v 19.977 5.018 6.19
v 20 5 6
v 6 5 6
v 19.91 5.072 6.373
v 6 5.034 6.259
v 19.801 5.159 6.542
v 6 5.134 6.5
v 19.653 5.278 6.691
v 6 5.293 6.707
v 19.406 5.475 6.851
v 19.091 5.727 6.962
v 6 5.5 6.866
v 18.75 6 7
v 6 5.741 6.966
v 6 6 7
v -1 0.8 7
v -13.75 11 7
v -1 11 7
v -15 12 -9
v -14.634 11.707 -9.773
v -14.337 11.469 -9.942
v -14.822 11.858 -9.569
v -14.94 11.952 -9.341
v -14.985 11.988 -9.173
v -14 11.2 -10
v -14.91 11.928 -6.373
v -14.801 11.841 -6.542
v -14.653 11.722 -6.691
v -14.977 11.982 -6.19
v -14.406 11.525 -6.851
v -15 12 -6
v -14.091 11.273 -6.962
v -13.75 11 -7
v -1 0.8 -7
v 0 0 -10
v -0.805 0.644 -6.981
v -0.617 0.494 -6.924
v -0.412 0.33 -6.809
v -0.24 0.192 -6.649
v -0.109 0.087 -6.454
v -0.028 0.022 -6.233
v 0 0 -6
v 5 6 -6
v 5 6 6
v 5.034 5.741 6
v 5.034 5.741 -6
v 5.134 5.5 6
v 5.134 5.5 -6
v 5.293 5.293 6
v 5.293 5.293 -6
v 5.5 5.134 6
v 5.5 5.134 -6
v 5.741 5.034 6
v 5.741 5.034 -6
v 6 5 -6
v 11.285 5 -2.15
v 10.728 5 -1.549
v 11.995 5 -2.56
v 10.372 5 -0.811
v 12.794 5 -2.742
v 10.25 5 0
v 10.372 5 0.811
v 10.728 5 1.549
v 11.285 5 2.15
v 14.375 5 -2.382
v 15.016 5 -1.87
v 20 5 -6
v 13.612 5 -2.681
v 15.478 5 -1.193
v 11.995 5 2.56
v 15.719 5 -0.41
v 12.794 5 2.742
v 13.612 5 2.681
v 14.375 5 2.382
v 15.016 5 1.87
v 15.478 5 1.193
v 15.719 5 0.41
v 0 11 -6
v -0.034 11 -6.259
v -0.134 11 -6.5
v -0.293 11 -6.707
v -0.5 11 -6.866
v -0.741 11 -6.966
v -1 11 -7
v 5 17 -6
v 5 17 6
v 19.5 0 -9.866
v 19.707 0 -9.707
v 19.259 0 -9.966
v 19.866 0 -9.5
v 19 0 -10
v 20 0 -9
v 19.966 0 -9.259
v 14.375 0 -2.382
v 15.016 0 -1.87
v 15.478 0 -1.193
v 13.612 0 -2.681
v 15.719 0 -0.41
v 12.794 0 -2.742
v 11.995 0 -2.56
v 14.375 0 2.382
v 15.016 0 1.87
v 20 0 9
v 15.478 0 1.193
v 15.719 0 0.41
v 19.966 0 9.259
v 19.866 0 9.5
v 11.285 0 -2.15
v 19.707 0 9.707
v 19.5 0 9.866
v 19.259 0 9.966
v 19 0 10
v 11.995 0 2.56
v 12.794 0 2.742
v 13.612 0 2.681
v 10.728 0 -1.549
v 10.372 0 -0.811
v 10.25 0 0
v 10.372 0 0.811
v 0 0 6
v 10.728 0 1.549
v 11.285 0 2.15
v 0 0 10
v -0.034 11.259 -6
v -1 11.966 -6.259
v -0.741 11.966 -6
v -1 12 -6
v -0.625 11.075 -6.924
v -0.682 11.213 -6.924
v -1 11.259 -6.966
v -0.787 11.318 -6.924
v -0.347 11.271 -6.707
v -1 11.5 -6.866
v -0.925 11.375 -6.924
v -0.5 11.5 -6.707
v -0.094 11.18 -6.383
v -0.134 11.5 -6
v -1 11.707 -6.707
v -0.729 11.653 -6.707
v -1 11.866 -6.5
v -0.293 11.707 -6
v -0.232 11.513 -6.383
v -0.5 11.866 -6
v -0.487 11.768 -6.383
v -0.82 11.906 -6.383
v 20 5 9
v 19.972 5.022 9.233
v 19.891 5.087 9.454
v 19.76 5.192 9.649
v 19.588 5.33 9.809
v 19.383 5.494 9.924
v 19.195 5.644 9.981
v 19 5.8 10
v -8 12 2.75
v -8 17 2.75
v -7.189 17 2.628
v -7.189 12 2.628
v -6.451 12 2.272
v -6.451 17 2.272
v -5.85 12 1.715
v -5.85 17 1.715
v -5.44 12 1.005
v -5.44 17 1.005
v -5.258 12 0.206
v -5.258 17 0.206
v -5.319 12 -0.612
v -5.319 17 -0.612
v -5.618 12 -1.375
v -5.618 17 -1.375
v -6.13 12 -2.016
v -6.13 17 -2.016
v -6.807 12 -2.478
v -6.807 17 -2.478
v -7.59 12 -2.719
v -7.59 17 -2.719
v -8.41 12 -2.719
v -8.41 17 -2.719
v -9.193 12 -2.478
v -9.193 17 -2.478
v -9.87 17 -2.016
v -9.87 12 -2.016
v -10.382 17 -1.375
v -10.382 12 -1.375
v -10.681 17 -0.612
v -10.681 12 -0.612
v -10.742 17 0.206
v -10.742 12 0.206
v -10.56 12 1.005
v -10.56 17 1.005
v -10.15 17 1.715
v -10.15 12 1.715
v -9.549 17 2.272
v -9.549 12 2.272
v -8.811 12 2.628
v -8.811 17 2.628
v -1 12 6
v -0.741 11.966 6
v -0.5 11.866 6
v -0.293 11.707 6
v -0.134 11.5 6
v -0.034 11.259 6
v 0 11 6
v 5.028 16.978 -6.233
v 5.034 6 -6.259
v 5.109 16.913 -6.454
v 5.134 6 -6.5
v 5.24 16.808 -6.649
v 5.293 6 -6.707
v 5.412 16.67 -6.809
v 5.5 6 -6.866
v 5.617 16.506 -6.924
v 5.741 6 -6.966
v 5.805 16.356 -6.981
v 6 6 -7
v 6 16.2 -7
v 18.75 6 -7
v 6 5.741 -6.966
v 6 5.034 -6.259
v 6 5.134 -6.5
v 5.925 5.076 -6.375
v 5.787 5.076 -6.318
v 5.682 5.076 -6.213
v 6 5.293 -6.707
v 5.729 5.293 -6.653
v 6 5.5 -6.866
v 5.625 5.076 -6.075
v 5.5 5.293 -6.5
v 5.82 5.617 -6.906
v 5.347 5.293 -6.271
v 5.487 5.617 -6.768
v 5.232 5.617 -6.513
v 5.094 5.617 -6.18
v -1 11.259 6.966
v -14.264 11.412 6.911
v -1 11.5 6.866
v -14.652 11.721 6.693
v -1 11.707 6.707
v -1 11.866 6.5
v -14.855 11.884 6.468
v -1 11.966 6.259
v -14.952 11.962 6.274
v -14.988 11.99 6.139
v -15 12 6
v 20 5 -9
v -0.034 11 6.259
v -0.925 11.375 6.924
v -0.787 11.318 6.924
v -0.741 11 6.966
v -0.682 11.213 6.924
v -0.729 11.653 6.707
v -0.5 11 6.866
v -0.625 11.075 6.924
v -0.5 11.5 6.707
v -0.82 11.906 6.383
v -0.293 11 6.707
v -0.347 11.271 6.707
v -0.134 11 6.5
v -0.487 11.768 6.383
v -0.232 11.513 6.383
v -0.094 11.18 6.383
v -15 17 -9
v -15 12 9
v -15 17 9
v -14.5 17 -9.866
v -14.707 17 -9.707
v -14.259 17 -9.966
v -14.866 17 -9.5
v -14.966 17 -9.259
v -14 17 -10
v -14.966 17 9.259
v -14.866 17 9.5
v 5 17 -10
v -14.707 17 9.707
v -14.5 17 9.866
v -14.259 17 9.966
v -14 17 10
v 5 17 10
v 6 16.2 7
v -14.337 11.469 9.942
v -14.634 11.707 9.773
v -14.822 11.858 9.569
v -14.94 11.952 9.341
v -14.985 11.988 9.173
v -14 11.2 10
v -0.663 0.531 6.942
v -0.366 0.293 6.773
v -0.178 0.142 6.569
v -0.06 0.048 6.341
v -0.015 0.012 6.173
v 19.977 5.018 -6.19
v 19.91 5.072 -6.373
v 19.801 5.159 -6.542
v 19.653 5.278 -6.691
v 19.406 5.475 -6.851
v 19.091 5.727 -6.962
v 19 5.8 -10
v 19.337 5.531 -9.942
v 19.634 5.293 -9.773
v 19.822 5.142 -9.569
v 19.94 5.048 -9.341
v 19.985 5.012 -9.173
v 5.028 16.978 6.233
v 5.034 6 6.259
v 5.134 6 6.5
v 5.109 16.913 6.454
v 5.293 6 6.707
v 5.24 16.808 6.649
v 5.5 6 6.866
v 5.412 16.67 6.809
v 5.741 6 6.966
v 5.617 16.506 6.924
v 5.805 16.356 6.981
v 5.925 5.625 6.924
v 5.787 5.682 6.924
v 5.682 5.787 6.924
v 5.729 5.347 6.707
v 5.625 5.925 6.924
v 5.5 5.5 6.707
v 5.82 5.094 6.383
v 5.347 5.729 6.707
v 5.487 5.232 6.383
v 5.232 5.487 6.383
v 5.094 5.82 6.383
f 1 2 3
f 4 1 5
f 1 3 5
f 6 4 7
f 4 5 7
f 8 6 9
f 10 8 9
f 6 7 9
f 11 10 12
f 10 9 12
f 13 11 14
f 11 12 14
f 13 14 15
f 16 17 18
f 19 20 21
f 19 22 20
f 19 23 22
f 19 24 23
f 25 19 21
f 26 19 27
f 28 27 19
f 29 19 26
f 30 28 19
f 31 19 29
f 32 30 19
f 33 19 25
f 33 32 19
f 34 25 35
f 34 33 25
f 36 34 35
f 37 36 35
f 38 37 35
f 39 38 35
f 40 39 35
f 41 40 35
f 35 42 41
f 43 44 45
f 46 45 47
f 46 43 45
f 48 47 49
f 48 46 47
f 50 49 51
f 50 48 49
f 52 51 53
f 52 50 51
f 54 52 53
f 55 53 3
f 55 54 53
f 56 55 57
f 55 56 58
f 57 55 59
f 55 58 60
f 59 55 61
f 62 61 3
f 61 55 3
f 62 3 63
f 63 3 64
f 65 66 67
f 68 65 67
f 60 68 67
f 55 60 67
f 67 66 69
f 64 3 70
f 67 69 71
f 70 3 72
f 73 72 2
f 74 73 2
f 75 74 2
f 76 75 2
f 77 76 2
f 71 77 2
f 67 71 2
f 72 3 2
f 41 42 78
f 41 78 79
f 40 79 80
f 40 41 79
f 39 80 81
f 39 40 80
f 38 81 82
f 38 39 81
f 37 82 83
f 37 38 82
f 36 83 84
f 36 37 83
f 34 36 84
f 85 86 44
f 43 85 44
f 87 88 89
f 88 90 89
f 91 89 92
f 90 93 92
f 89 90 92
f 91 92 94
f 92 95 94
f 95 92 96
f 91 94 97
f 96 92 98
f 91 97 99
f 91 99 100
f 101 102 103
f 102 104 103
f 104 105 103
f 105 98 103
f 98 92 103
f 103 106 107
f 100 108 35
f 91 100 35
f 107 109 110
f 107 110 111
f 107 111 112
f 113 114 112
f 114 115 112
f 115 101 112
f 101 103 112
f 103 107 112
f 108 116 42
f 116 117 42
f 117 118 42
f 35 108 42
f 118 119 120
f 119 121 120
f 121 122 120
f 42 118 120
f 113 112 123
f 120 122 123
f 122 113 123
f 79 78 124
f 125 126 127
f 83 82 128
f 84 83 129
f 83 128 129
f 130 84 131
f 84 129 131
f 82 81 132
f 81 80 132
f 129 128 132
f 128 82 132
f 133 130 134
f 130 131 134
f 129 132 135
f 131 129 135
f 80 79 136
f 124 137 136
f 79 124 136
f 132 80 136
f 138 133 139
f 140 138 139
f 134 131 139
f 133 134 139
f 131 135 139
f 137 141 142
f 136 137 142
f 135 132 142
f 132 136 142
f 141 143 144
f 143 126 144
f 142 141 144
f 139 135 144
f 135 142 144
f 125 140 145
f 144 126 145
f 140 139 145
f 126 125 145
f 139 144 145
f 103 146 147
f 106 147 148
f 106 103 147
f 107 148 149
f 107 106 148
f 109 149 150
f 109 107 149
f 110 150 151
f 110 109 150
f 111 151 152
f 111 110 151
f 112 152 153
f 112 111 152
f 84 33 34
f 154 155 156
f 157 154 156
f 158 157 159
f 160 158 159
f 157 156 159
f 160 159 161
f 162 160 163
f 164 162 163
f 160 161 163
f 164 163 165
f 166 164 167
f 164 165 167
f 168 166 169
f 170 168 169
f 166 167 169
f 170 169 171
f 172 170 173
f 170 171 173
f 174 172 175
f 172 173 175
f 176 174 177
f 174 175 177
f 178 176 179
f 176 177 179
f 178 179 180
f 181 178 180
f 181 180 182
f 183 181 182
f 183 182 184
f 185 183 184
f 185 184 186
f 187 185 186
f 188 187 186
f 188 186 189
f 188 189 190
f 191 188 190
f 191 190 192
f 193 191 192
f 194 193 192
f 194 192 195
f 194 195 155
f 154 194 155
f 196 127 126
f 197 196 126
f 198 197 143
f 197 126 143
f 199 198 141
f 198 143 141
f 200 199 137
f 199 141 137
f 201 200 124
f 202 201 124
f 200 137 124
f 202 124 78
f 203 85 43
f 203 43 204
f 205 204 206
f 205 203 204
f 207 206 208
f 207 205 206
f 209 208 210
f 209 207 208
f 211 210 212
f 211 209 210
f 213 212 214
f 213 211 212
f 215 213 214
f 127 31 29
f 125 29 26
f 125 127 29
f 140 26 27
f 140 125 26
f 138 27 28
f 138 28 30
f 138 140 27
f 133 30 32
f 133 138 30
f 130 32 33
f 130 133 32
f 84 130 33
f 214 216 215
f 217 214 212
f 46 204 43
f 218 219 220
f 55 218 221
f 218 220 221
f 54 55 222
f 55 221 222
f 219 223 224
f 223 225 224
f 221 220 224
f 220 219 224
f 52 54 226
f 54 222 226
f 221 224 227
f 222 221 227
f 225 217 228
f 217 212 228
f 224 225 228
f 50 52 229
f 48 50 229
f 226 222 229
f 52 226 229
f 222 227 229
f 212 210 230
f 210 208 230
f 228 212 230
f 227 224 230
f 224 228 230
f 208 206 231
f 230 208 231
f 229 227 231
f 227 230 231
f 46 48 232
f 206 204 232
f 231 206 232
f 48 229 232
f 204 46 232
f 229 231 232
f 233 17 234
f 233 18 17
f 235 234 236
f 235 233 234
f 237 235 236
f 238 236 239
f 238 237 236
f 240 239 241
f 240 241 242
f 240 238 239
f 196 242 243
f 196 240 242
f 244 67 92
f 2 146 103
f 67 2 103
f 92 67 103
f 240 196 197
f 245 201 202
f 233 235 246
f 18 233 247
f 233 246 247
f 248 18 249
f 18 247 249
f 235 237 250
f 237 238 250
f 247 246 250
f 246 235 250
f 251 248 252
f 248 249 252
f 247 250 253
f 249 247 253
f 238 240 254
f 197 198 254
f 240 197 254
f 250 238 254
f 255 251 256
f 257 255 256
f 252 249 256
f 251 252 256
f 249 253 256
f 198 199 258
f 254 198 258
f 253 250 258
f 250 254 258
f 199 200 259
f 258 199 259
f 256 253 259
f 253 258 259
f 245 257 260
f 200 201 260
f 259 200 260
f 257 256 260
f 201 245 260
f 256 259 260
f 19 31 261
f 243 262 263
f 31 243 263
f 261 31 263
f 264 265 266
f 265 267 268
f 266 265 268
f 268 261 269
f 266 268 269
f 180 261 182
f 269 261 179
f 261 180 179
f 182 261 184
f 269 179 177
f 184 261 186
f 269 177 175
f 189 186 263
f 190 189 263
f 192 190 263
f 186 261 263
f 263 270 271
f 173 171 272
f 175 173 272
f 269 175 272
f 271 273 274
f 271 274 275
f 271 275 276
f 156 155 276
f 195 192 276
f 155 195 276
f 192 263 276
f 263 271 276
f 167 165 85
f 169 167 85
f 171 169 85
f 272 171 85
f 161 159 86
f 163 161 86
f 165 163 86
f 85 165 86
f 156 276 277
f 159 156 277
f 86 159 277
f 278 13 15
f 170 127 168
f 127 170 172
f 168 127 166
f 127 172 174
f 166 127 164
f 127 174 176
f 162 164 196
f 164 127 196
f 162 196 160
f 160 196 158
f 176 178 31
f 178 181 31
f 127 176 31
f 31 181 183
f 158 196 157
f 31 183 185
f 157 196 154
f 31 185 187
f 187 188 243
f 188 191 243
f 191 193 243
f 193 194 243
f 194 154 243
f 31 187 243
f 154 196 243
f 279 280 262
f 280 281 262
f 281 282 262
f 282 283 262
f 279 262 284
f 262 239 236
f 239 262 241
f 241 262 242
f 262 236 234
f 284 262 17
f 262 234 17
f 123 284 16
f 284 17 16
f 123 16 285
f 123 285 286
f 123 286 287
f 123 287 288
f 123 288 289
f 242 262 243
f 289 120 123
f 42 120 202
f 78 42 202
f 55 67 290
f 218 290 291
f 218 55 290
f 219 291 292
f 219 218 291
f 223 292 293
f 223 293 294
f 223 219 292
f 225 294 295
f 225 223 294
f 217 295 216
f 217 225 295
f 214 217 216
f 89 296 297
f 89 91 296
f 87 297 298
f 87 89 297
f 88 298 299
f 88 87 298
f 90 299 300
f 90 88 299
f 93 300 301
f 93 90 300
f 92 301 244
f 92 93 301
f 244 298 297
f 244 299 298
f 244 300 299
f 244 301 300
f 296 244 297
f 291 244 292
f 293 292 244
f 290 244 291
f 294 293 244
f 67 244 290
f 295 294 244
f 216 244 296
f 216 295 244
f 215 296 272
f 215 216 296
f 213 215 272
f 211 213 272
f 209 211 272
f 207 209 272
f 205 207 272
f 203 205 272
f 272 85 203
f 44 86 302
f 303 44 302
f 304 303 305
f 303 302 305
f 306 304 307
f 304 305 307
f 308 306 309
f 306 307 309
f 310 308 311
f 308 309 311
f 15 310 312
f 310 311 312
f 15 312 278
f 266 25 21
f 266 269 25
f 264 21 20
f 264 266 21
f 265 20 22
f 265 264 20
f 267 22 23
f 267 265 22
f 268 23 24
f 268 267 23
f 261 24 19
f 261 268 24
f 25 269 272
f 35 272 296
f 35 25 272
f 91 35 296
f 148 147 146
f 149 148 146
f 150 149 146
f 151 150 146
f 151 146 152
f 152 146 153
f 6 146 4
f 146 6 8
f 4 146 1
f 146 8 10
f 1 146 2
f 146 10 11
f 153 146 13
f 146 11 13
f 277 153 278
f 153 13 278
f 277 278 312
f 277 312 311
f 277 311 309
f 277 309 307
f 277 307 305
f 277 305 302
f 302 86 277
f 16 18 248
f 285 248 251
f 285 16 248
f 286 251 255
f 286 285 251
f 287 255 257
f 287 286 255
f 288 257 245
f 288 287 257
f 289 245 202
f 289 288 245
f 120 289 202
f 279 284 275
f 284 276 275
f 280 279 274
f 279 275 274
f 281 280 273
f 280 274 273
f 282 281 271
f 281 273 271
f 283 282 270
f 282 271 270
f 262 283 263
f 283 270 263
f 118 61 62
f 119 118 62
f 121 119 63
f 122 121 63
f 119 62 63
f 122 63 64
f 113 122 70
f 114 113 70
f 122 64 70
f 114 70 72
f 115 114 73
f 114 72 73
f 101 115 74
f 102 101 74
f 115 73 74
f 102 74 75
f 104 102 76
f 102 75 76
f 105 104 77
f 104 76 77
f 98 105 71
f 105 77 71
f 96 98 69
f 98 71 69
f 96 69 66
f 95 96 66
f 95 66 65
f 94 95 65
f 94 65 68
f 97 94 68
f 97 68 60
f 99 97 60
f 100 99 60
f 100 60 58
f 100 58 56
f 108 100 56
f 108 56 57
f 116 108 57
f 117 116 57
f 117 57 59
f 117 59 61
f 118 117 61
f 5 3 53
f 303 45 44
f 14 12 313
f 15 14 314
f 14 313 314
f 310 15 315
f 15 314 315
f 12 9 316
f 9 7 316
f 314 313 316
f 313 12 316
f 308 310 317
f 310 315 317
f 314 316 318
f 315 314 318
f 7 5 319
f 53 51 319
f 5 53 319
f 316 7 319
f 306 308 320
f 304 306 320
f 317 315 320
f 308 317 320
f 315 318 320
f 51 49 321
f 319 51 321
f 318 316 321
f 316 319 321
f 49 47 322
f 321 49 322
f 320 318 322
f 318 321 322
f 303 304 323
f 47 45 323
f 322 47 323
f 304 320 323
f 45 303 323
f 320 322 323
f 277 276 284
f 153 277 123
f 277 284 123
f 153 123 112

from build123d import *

# Parameters (mm, degrees)
BOSS_EXTRUDE1_DEPTH = 10
SKETCH2_R           = 2.75
CUT_EXTRUDE1_DEPTH  = 29.08914381
SKETCH3_R           = 2.75
CUT_EXTRUDE2_DEPTH  = 26.377155081
RIB7_REACH          = 35
SKETCH5_WALL_W      = 87.209372712
SKETCH5_WALL_H      = 3
RIB8_REACH          = 35
SKETCH6_WALL_W      = 87.209372712
SKETCH6_WALL_H      = 3
FILLET1_R           = 1
FILLET2_R           = 1


with BuildPart() as part:
    # Sketch1 → Boss-Extrude1 (new, symmetric)
    with BuildSketch(Plane.XY):
        Polygon((0, 0), (0, 12), (-15, 12), (-15, 17), (5, 17), (5, 5), (20, 5), (20, 0), align=None)
    extrude(amount=BOSS_EXTRUDE1_DEPTH, both=True)

    # Sketch2 → Cut-Extrude1 (cut, through all)
    with BuildSketch(Plane(origin=(0, 17, 0), x_dir=(1, 0, 0), z_dir=(0, 1, 0))):
        with Locations(Location((-8, 0, 0), (0, 0, 270))):
            Circle(SKETCH2_R)
    extrude(amount=-CUT_EXTRUDE1_DEPTH, mode=Mode.SUBTRACT)

    # Sketch3 → Cut-Extrude2 (cut, through all)
    with BuildSketch(Plane(origin=(0, 5, 0), x_dir=(1, 0, 0), z_dir=(0, 1, 0))):
        with Locations(Location((13, 0, 0), (0, 0, 180))):
            Circle(SKETCH3_R)
    extrude(amount=-CUT_EXTRUDE2_DEPTH, mode=Mode.SUBTRACT)

    # Sketch5 wall → Rib7 (add, up to next)
    with BuildSketch(Plane(origin=(12.5, 11, -10), x_dir=(-0.780868809443, 0.624695047554, 0), z_dir=(0.624695047554, 0.780868809443, 0)), mode=Mode.PRIVATE) as rib7_sk1:
        with Locations((0, 1.5)):
            Rectangle(SKETCH5_WALL_W, SKETCH5_WALL_H)
    rib7_tool1 = extrude(rib7_sk1.sketch, amount=-RIB7_REACH, mode=Mode.PRIVATE) - part.part
    rib7 = rib7_tool1.solids().sort_by_distance((12.5, 11, -10))[0]
    add(rib7)

    # Sketch6 wall → Rib8 (add, up to next)
    with BuildSketch(Plane(origin=(-7.5, 6, -10), x_dir=(0.780868809443, -0.624695047554, 0), z_dir=(-0.624695047554, -0.780868809443, 0)), mode=Mode.PRIVATE) as rib8_sk1:
        with Locations((0, 1.5)):
            Rectangle(SKETCH6_WALL_W, SKETCH6_WALL_H)
    rib8_tool1 = extrude(rib8_sk1.sketch, amount=-RIB8_REACH, mode=Mode.PRIVATE) - part.part
    rib8 = rib8_tool1.solids().sort_by_distance((-7.5, 6, -10))[0]
    add(rib8)

    # Mirror1: Rib7, Rib8 across plane
    add(rib7.mirror(Plane.XY))
    add(rib8.mirror(Plane.XY))

    # Fillet1
    fillet1_edges = [part.edges().sort_by_distance(p)[0] for p in [
        (0, 12, 0),
        (-7.5, 12, 7),
        (0, 6, 7),
        (5, 11, -7),
        (12.5, 5, -7),
        (0, 6, -7),
        (-7.5, 12, -7),
        (5, 5, 0),
        (12.5, 5, 7),
        (5, 11, 7),
    ]]
    fillet(fillet1_edges, radius=FILLET1_R)

    # Fillet2
    fillet2_edges = [part.edges().sort_by_distance(p)[0] for p in [
        (20, 2.5, -10),
        (-15, 14.5, 10),
        (20, 2.5, 10),
        (-15, 14.5, -10),
    ]]
    fillet(fillet2_edges, radius=FILLET2_R)


solid = part.part
